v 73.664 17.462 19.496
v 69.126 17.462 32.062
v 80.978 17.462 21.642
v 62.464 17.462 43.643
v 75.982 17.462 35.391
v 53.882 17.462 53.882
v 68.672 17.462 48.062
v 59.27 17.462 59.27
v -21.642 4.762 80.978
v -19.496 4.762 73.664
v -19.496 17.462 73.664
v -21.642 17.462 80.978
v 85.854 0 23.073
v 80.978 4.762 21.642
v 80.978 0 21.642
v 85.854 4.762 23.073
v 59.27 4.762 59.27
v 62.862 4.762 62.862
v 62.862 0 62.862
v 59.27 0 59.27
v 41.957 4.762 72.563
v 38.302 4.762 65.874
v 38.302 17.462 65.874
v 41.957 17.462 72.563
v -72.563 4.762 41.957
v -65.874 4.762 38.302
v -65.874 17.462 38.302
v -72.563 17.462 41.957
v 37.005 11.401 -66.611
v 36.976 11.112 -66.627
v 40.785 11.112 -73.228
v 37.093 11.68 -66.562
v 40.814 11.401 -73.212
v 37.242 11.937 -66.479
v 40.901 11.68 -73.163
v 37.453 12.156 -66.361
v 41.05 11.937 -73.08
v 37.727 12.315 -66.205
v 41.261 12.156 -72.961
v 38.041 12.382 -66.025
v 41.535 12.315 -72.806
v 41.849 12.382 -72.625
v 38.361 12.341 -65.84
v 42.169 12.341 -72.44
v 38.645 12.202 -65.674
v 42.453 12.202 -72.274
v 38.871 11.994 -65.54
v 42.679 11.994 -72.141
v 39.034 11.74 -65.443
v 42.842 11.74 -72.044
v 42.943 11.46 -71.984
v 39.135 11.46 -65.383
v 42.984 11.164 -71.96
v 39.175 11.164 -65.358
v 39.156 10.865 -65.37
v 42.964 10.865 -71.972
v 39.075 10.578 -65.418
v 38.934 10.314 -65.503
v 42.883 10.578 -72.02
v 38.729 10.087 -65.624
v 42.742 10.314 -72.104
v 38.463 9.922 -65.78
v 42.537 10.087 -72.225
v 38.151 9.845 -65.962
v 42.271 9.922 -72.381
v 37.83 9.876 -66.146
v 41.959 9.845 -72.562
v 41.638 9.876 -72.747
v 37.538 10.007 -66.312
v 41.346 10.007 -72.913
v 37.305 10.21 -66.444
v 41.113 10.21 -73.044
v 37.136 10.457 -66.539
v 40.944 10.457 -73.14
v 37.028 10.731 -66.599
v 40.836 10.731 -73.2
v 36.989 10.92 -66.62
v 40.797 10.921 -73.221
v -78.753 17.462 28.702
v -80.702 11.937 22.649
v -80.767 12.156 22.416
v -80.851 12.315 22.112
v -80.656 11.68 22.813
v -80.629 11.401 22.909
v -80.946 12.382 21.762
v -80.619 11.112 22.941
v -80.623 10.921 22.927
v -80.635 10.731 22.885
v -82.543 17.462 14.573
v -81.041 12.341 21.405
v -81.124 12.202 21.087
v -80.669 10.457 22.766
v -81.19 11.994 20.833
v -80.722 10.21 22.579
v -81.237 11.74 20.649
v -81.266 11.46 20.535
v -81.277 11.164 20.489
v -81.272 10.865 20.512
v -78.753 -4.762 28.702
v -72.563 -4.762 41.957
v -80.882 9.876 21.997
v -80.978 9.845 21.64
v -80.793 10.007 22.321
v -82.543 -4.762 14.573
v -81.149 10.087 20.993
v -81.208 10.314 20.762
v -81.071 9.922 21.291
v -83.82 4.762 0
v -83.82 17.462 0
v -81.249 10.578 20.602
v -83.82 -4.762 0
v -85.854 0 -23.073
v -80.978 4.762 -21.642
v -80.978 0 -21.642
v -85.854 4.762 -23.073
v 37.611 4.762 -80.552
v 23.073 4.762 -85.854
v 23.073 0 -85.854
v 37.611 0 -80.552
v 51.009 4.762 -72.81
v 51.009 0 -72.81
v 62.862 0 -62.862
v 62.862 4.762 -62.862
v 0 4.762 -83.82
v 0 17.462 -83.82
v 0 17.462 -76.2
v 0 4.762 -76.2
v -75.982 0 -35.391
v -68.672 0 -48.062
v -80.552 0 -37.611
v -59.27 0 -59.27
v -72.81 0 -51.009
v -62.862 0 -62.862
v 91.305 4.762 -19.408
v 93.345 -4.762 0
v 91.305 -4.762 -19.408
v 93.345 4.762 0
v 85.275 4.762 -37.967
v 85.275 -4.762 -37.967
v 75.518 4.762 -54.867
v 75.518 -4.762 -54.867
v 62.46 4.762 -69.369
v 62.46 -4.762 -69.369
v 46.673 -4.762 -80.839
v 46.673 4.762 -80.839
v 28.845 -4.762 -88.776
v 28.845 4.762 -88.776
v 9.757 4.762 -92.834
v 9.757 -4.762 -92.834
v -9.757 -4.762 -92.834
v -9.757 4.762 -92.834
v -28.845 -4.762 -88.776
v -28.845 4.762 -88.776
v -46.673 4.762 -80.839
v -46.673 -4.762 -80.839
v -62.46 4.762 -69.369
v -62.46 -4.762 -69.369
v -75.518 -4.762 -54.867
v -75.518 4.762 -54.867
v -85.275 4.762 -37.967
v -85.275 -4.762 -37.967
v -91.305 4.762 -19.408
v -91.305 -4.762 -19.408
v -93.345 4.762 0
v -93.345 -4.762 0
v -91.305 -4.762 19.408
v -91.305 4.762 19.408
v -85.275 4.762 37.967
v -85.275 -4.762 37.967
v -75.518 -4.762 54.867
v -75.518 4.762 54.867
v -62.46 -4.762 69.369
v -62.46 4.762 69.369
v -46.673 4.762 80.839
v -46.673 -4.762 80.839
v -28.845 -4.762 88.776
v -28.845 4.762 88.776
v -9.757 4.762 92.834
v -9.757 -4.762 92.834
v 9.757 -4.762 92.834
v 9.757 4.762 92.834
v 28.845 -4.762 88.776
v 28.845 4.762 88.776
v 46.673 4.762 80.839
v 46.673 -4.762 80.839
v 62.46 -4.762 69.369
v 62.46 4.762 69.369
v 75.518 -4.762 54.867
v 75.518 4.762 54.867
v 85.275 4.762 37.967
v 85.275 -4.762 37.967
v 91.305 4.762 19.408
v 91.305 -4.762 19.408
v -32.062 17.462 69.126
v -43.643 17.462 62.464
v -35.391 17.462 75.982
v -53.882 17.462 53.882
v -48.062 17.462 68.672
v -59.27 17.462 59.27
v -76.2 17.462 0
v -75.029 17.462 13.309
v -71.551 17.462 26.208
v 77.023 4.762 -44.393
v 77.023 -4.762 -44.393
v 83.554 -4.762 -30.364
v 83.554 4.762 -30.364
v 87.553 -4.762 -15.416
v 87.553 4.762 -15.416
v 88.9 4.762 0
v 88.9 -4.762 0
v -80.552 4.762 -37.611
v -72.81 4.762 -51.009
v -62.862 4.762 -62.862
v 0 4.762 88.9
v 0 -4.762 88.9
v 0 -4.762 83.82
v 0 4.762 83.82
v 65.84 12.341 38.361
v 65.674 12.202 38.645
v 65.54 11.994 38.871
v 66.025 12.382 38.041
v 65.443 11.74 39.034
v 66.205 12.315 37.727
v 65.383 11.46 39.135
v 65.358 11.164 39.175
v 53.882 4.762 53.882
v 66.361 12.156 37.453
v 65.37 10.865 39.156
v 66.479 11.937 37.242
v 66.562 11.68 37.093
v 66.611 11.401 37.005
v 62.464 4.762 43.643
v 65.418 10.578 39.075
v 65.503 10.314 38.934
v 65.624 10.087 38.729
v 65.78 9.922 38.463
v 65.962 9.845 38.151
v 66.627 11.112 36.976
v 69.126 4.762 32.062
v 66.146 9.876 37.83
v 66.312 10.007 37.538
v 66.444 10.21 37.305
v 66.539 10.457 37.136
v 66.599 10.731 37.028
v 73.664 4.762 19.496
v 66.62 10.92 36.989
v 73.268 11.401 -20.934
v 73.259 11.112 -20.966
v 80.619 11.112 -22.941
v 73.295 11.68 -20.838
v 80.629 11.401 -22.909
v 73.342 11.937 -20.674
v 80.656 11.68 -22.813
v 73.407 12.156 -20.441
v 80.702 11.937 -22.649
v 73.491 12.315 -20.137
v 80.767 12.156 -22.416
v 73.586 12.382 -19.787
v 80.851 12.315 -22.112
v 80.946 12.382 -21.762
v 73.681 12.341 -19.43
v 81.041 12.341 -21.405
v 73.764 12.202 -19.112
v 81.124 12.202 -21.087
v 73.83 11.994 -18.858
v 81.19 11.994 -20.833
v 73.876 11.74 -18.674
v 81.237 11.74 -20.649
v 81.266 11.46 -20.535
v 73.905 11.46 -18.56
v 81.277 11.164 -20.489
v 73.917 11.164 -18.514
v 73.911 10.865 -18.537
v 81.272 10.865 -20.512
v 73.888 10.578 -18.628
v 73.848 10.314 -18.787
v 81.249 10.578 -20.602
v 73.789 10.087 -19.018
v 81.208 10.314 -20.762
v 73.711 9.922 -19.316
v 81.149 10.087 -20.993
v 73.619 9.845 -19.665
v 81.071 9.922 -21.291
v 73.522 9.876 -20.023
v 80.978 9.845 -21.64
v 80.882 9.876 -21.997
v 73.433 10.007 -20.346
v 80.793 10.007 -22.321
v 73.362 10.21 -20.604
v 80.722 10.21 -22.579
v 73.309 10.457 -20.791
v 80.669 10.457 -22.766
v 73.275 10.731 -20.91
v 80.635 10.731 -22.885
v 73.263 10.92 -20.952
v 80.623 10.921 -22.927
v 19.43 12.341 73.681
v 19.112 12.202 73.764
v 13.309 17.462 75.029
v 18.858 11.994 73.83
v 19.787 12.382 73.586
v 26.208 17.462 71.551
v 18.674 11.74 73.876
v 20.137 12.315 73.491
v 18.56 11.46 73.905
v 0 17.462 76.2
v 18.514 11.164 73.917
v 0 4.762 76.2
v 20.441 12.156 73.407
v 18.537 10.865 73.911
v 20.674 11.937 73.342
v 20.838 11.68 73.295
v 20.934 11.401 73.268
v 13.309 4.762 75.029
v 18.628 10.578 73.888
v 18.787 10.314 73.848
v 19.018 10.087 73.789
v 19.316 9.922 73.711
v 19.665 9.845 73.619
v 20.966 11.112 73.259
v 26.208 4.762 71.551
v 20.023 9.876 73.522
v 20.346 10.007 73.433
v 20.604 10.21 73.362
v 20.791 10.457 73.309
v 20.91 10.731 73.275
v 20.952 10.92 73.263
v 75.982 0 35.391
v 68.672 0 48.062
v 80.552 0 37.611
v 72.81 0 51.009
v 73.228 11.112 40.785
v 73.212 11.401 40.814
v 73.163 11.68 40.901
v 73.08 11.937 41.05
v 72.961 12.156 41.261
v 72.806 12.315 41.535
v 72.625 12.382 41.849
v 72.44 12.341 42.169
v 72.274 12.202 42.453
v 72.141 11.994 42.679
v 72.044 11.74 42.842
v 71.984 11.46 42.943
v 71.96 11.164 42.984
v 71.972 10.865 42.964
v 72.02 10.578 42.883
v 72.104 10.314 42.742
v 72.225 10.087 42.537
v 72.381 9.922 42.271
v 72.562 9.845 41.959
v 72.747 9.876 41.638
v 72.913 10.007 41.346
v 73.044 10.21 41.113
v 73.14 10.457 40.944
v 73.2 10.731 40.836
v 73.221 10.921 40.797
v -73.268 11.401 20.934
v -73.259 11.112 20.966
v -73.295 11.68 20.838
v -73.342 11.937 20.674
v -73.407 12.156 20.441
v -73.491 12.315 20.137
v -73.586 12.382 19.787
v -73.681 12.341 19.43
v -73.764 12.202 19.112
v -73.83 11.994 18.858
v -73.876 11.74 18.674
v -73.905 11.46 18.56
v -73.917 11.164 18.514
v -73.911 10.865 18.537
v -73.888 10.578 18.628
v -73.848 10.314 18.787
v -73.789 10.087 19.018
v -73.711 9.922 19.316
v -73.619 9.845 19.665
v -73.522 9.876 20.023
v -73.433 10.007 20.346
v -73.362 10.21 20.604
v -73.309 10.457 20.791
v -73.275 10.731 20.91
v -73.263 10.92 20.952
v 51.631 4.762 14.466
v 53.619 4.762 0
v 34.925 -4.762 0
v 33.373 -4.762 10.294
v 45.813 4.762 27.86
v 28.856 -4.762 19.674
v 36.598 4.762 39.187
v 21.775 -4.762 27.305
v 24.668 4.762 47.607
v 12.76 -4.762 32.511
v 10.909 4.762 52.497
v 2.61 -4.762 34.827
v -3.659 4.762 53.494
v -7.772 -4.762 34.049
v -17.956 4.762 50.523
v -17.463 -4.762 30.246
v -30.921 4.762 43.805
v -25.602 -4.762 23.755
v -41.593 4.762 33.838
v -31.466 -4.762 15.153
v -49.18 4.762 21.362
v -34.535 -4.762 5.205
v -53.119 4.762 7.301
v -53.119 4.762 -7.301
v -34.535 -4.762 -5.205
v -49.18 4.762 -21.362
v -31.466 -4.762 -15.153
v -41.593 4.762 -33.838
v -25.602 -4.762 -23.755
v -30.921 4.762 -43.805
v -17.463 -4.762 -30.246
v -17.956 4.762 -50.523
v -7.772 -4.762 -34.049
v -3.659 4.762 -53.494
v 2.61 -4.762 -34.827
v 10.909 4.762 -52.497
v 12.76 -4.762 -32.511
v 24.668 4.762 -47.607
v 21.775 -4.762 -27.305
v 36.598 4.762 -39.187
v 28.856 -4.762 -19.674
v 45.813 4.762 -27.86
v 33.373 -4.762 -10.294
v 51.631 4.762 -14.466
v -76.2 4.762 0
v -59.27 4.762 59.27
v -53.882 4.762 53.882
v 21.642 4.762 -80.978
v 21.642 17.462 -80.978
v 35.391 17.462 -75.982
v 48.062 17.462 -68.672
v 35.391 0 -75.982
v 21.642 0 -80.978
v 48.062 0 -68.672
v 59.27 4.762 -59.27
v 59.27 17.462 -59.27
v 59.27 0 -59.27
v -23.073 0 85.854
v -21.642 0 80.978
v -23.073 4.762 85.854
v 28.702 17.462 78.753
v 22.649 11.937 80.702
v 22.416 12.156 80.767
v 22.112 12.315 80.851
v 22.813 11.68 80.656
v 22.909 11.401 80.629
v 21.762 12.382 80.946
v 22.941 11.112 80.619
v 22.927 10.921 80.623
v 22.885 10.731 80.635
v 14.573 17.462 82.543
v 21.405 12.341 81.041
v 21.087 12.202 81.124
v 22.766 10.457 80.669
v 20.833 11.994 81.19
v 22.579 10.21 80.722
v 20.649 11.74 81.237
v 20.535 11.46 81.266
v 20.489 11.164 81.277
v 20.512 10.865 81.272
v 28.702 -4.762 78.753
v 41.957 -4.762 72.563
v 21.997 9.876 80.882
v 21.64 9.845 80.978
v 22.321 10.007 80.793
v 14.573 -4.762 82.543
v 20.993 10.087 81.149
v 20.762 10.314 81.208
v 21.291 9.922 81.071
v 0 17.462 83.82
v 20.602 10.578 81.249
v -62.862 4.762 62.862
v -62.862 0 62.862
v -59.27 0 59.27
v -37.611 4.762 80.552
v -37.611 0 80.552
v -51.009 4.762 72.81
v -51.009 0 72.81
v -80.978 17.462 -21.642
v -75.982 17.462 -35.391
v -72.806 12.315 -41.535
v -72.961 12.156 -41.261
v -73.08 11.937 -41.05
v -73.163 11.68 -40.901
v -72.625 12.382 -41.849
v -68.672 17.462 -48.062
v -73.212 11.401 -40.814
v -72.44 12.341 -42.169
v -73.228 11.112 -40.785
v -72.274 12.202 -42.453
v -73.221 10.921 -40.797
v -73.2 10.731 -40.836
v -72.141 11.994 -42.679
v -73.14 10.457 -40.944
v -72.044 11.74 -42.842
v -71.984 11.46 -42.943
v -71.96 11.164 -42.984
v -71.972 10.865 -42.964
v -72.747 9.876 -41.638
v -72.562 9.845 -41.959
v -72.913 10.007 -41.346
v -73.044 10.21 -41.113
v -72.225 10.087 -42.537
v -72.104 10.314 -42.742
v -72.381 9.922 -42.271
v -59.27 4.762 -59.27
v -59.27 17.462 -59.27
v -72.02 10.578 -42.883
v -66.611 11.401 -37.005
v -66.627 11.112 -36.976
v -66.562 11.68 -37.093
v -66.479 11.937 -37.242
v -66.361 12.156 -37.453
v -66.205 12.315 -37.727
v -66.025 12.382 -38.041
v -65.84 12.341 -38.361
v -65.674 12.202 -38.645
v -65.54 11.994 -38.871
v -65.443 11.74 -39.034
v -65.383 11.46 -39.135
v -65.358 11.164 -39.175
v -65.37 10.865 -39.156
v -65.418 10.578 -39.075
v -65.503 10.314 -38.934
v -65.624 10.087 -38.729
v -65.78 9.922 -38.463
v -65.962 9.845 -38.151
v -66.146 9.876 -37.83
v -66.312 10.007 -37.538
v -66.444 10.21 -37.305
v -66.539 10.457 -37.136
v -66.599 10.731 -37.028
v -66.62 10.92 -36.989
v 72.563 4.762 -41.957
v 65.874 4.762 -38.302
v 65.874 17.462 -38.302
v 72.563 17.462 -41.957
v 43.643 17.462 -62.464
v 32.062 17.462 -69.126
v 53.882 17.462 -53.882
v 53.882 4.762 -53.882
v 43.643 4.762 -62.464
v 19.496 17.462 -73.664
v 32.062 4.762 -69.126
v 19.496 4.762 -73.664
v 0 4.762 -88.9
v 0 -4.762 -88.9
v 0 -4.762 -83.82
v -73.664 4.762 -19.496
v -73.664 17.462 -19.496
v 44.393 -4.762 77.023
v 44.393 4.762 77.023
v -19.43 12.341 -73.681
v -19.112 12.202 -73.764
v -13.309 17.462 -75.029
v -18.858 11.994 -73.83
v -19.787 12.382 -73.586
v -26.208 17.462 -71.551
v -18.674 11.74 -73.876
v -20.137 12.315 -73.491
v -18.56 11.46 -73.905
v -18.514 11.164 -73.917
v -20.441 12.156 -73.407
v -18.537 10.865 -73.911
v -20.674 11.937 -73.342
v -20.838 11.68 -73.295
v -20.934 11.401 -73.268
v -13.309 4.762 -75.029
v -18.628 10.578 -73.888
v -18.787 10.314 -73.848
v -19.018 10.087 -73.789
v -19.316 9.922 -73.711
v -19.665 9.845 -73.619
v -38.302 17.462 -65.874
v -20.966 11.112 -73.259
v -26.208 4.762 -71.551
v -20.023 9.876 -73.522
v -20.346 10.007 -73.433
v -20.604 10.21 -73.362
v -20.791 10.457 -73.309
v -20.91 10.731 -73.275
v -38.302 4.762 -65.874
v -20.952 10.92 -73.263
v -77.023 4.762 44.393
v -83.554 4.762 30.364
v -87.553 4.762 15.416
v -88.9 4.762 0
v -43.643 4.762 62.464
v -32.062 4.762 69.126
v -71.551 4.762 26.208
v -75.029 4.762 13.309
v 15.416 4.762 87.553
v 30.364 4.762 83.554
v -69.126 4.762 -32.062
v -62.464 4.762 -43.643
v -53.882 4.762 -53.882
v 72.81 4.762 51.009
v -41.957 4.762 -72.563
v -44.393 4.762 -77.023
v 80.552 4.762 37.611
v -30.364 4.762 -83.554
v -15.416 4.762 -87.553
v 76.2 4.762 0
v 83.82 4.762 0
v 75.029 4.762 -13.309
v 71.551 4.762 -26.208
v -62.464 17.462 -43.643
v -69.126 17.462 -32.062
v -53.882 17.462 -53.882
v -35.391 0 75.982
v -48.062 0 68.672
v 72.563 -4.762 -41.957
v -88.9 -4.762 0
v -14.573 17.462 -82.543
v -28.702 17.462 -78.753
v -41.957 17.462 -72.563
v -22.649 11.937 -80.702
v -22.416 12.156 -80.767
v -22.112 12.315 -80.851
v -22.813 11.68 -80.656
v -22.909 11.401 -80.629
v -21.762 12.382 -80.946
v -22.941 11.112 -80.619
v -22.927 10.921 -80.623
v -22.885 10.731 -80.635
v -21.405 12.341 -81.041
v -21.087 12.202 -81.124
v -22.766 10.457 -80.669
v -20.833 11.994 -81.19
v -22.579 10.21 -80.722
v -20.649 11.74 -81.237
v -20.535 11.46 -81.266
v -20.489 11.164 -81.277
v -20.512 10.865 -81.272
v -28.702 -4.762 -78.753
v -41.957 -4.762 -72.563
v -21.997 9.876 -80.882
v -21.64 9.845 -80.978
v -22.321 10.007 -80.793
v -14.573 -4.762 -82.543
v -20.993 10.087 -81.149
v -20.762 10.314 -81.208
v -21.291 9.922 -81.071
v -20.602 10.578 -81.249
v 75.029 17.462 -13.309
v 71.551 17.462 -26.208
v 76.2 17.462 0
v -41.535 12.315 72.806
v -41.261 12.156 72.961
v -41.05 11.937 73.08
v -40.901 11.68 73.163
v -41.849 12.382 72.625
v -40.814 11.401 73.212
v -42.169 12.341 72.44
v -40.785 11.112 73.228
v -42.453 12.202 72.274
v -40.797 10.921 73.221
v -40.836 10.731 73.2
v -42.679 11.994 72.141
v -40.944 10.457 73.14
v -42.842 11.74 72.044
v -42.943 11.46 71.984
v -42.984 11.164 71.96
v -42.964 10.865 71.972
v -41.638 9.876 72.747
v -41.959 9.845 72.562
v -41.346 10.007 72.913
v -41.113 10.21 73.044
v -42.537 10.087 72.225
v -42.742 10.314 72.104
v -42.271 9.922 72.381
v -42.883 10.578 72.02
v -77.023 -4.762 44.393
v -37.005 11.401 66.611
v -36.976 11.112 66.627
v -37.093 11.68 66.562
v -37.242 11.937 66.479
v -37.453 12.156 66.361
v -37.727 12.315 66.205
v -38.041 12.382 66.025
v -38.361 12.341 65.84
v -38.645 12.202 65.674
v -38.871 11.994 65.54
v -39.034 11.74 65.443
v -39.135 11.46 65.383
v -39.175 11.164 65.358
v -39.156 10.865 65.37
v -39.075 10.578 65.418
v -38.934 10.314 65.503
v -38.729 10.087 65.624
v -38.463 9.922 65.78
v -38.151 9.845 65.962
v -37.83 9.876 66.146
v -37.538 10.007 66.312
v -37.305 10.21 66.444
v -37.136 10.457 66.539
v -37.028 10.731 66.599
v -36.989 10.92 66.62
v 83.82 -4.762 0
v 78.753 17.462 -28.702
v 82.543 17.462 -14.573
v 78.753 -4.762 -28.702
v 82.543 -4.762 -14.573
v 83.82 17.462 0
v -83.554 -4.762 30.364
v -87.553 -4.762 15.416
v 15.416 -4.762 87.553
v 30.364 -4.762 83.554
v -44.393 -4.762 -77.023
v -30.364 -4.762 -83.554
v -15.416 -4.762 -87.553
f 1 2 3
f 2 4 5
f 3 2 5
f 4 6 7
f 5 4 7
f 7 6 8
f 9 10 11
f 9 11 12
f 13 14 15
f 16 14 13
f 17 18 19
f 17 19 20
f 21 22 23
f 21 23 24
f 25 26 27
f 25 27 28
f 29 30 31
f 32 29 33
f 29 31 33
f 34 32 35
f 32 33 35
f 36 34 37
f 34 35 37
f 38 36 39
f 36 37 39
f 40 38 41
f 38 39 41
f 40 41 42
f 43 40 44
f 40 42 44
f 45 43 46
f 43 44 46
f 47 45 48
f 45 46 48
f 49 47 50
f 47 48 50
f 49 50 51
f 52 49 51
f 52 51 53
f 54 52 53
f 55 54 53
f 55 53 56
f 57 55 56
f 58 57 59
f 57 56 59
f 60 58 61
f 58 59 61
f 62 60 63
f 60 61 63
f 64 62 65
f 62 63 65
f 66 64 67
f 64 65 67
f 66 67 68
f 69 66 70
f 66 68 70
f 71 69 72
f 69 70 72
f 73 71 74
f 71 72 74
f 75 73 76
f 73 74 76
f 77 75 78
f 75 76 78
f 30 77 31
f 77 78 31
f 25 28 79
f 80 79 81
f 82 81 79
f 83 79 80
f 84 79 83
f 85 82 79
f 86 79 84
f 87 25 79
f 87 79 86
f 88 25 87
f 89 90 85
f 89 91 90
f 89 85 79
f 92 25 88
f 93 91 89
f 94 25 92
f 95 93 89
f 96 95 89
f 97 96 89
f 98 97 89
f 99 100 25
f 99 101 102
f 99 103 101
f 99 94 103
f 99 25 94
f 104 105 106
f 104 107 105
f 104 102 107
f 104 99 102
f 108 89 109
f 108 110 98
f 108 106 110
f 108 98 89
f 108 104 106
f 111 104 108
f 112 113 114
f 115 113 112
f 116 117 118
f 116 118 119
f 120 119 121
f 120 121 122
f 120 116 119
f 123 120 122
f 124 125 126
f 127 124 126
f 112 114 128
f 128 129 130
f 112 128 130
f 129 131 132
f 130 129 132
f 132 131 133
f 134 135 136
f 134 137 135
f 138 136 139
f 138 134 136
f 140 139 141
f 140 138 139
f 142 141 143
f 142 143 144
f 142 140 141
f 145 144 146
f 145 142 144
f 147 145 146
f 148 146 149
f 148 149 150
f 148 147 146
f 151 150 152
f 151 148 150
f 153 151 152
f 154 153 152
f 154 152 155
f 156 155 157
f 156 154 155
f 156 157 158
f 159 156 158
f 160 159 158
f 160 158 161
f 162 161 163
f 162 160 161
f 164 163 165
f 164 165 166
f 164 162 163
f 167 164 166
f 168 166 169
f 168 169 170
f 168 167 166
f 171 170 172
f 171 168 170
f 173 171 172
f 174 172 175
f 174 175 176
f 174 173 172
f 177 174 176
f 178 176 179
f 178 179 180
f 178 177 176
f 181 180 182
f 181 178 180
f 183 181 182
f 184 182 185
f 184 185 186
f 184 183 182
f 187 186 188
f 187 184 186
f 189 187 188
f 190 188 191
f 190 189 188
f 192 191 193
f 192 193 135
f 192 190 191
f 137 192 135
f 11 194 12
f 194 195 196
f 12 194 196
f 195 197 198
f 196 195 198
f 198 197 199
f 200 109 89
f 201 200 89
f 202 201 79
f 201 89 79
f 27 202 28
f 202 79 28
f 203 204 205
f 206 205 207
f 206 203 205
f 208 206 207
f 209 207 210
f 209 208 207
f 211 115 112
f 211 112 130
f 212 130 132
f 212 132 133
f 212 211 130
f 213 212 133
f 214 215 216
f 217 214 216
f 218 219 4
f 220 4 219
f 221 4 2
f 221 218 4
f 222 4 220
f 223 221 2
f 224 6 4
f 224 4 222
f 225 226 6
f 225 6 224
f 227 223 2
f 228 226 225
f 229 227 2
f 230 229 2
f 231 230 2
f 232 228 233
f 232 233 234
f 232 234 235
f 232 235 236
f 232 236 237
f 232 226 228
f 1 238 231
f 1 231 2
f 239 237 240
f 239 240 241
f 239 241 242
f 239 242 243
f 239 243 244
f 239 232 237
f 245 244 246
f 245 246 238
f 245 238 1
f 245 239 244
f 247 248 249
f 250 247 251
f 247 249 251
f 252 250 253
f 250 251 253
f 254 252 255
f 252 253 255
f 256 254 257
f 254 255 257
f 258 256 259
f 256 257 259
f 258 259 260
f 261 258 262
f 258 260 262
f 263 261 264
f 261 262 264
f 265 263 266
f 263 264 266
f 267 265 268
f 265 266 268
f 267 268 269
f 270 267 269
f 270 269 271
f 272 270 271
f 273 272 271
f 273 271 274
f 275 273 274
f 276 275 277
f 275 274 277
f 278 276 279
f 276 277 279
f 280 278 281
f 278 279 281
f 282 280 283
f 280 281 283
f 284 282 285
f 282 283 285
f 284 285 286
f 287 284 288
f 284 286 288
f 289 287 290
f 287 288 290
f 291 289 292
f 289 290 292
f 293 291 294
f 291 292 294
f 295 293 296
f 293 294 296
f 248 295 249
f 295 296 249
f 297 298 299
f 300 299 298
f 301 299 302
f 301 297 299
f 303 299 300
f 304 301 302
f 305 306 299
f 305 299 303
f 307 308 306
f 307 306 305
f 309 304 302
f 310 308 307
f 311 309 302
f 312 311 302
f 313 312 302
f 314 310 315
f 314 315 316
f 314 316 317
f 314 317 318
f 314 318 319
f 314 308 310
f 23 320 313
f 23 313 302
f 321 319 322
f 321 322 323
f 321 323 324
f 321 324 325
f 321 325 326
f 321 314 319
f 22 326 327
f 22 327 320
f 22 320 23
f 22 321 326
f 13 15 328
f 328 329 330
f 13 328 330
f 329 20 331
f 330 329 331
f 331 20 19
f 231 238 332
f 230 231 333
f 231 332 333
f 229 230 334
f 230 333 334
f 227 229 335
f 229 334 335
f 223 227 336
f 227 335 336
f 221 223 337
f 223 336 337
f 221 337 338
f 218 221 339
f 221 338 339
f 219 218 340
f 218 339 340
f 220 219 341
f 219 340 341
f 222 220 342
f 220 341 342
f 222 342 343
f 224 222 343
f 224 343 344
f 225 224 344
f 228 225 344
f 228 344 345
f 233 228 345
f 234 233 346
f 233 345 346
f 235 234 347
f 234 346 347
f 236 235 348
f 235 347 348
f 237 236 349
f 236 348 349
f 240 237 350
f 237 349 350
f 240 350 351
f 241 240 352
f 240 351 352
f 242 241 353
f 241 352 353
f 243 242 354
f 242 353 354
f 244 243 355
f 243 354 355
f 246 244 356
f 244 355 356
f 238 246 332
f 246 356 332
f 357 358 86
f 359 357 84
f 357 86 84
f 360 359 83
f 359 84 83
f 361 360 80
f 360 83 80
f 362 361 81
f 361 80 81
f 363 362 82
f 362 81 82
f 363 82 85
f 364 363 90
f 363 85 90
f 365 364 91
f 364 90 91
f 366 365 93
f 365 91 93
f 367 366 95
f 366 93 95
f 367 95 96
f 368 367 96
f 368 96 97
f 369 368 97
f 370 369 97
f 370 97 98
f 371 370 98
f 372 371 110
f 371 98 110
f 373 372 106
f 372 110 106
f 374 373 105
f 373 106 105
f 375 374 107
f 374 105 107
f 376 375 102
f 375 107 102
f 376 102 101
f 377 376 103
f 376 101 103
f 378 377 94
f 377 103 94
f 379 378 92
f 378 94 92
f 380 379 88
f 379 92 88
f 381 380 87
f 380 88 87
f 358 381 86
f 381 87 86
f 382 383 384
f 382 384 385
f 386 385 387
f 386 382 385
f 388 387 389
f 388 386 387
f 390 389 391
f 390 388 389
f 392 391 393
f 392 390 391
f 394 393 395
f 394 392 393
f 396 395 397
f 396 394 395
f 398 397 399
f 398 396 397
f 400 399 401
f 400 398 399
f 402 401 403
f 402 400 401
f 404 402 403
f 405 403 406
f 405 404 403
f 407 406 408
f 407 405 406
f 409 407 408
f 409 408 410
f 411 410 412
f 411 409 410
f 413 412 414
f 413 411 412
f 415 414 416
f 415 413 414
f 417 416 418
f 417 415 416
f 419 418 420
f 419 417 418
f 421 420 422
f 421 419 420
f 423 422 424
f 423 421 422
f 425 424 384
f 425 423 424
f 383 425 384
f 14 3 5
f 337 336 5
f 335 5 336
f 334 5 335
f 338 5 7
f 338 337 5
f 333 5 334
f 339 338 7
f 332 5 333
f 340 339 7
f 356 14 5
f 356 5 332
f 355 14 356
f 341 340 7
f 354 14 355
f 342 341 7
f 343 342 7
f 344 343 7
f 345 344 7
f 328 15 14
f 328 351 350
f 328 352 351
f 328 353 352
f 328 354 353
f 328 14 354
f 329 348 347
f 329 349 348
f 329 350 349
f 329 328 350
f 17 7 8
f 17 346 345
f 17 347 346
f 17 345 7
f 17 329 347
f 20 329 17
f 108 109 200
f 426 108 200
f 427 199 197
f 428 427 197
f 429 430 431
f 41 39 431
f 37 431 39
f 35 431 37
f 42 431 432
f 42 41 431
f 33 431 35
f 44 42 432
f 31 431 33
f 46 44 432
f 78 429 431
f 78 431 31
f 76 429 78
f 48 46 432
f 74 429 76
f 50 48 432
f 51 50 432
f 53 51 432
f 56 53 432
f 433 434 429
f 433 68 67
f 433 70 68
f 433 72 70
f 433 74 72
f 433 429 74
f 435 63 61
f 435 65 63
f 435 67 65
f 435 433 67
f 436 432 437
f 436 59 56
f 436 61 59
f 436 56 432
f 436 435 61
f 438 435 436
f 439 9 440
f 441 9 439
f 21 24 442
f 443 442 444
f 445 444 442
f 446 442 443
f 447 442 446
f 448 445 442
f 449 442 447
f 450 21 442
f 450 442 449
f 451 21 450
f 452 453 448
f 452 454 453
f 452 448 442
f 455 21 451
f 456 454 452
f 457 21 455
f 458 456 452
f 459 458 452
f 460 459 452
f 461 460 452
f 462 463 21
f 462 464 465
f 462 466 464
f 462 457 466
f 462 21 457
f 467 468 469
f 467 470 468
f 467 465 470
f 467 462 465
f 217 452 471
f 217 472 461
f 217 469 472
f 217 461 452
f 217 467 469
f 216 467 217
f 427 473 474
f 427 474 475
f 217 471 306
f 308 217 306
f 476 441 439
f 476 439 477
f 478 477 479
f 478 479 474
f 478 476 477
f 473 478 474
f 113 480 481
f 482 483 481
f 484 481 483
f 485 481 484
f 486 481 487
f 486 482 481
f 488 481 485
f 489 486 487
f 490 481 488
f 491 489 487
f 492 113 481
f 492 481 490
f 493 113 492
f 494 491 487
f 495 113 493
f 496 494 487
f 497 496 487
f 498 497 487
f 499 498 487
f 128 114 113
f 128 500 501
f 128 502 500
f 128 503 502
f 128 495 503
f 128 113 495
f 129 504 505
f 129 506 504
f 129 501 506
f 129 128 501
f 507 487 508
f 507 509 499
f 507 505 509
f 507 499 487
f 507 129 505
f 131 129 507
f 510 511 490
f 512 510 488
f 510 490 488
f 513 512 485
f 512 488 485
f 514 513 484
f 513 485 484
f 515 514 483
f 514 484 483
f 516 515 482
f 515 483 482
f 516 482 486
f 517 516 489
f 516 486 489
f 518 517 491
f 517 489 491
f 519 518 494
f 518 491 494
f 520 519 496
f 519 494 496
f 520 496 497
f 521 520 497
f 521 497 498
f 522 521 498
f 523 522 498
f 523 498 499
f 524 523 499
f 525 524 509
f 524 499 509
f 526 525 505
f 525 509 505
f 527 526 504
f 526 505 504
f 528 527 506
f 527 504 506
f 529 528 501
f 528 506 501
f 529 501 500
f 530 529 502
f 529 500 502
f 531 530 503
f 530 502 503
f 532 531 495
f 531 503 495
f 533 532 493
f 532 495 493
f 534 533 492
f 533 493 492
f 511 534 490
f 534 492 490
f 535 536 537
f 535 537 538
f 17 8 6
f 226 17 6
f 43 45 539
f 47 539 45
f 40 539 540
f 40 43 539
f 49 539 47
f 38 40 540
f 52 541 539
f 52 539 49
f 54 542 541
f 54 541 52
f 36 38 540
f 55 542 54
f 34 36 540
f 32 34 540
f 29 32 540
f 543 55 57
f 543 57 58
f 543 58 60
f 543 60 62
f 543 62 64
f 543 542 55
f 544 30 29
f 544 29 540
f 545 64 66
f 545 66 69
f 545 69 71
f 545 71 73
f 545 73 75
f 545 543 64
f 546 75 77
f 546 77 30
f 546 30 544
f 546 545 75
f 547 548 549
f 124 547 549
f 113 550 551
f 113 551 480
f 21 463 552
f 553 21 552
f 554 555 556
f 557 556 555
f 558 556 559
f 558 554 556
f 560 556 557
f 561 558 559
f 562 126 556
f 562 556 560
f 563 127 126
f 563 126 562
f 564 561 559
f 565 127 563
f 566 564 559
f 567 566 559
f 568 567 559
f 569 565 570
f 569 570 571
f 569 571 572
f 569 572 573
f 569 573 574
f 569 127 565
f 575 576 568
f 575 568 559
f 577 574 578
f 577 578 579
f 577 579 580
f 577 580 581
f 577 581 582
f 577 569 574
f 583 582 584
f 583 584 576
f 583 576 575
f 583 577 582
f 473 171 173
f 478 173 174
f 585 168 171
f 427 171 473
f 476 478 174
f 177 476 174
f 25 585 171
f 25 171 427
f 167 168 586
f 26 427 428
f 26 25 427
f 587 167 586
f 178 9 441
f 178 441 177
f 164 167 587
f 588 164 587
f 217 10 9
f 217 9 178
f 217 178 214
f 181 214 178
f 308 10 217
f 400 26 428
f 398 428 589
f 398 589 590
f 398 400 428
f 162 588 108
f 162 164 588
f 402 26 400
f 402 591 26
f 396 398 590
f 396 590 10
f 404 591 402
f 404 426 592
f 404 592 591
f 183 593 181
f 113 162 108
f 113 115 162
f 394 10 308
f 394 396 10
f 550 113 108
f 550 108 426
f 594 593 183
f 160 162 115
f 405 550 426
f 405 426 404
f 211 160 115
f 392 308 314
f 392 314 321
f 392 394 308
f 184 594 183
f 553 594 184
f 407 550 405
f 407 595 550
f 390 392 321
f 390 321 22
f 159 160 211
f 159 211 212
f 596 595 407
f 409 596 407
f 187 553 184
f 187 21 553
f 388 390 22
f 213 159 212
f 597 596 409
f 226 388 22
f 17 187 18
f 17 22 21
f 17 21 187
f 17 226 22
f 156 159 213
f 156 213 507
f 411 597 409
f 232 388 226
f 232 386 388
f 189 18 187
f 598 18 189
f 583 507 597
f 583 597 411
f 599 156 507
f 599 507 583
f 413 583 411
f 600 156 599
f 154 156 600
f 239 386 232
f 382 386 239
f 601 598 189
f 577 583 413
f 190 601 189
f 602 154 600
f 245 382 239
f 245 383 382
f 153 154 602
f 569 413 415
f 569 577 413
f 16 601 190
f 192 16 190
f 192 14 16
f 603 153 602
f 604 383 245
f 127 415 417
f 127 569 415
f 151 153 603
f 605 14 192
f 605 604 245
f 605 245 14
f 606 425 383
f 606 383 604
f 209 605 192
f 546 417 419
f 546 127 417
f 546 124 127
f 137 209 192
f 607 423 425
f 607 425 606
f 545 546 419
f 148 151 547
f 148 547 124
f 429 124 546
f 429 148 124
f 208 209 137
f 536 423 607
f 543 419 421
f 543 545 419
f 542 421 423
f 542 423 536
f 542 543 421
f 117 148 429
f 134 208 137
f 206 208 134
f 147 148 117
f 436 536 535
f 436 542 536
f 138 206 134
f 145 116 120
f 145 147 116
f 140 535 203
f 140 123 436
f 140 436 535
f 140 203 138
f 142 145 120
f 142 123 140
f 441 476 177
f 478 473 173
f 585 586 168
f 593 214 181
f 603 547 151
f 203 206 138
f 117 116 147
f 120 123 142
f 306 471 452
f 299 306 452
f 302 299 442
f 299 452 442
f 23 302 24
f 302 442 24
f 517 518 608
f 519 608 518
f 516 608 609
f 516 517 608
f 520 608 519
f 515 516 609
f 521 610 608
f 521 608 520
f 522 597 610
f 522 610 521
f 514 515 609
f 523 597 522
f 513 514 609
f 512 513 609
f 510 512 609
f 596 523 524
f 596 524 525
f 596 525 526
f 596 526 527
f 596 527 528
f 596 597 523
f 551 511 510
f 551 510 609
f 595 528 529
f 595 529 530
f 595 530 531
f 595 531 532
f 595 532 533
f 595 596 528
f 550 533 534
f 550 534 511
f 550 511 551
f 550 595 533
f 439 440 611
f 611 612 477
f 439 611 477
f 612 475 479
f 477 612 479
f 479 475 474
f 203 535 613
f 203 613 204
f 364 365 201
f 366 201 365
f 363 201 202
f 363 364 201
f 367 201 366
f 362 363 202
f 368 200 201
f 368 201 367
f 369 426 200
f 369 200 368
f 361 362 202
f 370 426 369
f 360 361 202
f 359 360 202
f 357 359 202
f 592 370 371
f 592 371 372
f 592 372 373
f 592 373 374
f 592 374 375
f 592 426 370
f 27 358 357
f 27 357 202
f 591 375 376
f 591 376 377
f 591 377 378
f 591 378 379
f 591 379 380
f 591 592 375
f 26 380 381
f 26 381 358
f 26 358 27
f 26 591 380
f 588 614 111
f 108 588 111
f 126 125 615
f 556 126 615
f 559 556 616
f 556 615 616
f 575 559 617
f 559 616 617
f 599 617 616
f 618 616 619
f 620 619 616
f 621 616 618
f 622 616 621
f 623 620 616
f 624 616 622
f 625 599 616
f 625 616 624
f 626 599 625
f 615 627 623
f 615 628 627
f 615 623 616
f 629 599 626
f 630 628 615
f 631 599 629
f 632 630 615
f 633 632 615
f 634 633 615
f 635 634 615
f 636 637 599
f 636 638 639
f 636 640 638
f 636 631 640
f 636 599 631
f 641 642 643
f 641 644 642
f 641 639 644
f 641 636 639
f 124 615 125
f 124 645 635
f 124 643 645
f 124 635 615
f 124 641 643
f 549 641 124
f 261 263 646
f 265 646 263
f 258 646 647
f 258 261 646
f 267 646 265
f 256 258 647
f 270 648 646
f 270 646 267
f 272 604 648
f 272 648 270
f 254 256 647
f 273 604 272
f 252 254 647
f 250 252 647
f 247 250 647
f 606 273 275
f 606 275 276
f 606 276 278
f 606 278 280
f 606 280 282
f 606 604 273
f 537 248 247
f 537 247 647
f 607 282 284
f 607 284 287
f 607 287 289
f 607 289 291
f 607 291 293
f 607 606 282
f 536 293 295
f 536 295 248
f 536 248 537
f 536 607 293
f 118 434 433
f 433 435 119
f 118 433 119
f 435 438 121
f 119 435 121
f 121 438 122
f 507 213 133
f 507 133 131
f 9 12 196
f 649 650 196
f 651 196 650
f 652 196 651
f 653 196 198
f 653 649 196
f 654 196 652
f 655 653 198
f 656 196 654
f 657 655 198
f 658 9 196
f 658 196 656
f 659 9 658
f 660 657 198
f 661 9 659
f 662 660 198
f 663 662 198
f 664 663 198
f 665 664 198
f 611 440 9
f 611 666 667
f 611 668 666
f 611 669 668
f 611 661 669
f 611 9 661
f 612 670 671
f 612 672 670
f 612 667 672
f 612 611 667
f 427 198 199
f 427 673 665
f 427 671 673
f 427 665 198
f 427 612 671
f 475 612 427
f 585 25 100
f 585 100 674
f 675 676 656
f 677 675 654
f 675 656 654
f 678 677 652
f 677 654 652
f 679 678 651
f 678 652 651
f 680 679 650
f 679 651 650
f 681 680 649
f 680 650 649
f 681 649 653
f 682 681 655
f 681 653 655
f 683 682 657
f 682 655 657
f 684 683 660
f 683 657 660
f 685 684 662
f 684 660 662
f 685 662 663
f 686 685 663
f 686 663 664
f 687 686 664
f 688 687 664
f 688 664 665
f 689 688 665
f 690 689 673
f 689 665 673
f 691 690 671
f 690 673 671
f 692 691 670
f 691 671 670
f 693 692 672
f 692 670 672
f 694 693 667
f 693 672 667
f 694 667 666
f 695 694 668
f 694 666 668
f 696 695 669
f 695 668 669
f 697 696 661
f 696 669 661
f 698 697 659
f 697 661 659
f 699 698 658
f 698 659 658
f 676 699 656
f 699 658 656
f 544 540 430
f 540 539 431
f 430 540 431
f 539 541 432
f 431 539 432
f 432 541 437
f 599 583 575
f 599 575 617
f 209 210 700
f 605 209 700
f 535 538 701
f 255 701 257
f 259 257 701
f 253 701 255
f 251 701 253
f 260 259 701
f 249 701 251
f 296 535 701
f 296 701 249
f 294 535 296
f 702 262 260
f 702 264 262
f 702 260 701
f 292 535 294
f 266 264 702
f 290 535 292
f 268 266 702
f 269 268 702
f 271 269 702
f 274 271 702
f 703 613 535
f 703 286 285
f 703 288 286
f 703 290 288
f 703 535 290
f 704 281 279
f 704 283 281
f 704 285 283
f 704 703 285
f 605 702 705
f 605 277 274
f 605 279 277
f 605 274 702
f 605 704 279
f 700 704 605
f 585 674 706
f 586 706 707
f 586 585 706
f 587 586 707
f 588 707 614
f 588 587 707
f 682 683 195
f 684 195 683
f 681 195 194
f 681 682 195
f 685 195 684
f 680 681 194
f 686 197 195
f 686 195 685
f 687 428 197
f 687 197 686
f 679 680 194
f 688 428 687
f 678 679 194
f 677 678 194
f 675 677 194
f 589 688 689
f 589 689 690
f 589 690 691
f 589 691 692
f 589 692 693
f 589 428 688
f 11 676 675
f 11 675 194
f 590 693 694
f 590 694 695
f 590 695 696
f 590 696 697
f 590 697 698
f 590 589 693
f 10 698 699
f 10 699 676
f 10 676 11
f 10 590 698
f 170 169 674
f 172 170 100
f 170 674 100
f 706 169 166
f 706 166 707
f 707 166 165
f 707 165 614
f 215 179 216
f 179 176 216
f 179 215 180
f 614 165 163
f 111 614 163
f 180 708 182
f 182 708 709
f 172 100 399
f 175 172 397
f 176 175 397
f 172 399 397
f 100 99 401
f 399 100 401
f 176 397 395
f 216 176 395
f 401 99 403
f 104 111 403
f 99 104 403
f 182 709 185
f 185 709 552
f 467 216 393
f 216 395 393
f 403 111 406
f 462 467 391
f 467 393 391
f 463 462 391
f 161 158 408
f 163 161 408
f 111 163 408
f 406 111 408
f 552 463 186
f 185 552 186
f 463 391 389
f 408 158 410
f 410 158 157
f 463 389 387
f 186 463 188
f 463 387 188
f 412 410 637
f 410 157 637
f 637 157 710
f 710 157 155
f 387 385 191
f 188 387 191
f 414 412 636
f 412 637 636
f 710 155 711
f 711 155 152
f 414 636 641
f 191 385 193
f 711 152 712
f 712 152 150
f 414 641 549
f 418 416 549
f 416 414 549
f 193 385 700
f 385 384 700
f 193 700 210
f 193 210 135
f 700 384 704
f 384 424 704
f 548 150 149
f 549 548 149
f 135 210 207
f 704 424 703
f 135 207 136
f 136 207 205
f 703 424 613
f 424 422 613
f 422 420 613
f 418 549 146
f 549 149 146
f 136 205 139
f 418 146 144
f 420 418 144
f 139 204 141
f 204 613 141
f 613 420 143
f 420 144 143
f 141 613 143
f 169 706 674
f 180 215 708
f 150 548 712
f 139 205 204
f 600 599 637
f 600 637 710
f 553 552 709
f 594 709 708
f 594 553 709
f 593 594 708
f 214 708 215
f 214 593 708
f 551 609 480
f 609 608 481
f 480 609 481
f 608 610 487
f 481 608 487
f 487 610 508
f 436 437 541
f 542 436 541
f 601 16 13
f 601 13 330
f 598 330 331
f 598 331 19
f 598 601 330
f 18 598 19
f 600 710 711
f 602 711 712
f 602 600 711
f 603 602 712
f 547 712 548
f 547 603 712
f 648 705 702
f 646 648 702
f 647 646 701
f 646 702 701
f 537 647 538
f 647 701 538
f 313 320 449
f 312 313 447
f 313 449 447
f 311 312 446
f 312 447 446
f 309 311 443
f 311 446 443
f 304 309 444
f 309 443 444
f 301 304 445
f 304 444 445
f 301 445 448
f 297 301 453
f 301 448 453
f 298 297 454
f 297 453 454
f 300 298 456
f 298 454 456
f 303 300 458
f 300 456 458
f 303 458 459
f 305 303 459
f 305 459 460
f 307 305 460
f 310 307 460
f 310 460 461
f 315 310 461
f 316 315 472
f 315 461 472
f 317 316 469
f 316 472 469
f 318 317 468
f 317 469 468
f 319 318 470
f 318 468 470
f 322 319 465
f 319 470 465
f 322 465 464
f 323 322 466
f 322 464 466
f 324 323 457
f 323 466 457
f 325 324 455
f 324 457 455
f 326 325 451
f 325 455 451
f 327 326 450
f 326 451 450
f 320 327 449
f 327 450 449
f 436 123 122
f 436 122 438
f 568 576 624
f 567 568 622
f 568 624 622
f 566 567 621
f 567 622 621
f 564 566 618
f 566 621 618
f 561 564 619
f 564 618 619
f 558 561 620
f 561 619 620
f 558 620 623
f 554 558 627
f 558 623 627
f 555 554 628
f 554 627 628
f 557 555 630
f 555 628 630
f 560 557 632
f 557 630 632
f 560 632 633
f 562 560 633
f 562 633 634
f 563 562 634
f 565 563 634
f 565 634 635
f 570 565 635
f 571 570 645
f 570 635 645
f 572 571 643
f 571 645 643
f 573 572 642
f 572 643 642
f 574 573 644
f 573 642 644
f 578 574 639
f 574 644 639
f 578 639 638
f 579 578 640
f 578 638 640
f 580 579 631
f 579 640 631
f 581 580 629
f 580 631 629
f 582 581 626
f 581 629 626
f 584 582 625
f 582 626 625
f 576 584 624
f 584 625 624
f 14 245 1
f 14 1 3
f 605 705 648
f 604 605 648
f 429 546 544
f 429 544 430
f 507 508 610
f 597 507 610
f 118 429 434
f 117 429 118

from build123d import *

# Parameters (mm, degrees)
BASE_DEPTH                 = 4.7625
BASE_DEPTH_BACK            = 4.7625
SKETCH1_R                  = 93.345
BOTTOM_SUPPORT_HOLES_DEPTH = 133.352951138
BOTTOM_START               = 12.7
BOTTOM_SUPPORT_GUIDE_DEPTH = 12.7
SKETCH6_R                  = 1.27
BOTTOM_BOLT_HOLE_DEPTH     = 12.7
TOP_SUPPORT_HOLES_DEPTH    = 4.7625
TOP_START                  = 12.7
TOP_SUPPORT_GUIDE_DEPTH    = 12.7
SKETCH12_R                 = 1.27
TOP_BOLT_HOLE_DEPTH        = 12.7
BOTTOM_PATTERN_COUNT       = 4
CIRPATTERN3_COUNT          = 4
SKETCH13_R                 = 34.925
CUT_EXTRUDE5_DEPTH         = 12.7


with BuildPart() as part:
    # Sketch1 → Base (new, two sides: drawn at the far end of the back side and taken through both)
    with BuildSketch(Plane(origin=(0, 0, 0), x_dir=(1, 0, 0), z_dir=(0, 1, 0)).offset(-BASE_DEPTH_BACK)):
        Circle(SKETCH1_R)
    extrude(amount=BASE_DEPTH + BASE_DEPTH_BACK)

    # Sketch2 → Bottom support holes (cut, through all)
    with BuildSketch(Plane(origin=(0, 4.7625, 0), x_dir=(1, 0, 0), z_dir=(0, 1, 0))):
        with BuildLine():
            Line((0, 88.9), (0, 83.82))
            ThreePointArc((0, 83.82), (-21.72026739, 80.956916842), (-41.956713931, 72.563258996))
            Line((-41.956713931, 72.563258996), (-44.39288973, 77.022602796))
            ThreePointArc((-44.39288973, 77.022602796), (-22.977169228, 85.879332172), (0, 88.9))
        make_face()
    bottom_support_holes = extrude(amount=-BOTTOM_SUPPORT_HOLES_DEPTH, mode=Mode.SUBTRACT)

    # Sketch3 → Bottom support guide (add)
    with BuildSketch(Plane(origin=(0, 4.7625, 0), x_dir=(1, 0, 0), z_dir=(0, 1, 0)).offset(BOTTOM_START)):
        with BuildLine():
            Line((0, 83.82), (0, 76.2))
            ThreePointArc((0, 76.2), (-19.834896001, 73.573207764), (-38.302281481, 65.8739344))
            Line((-38.302281481, 65.8739344), (-41.956713931, 72.563258996))
            ThreePointArc((-41.956713931, 72.563258996), (-21.72026739, 80.956916842), (0, 83.82))
        make_face()
    bottom_support_guide = extrude(amount=-BOTTOM_SUPPORT_GUIDE_DEPTH)

    # Sketch6 → Bottom bolt hole (cut, symmetric)
    with BuildSketch(Plane(origin=(-20.978356966, 0, -78.191629498), x_dir=(-0.9658424820058785, 0, 0.2591298901183038), z_dir=(-0.2591298901183038, 0, -0.9658424820058785))):
        with Locations((-0.00326739, 11.1125)):
            Circle(SKETCH6_R)
    bottom_bolt_hole = extrude(amount=BOTTOM_BOLT_HOLE_DEPTH, both=True, mode=Mode.SUBTRACT)

    # Sketch8 → Top support holes (cut)
    with BuildSketch(Plane(origin=(-31.122978549, 4.7625, 77.296707326), x_dir=(1, 0, 0), z_dir=(0, 1, 0))):
        with BuildLine():
            Line((-31.738814298, 140.158500173), (-28.14671185, 136.566397725))
            ThreePointArc((-28.14671185, 136.566397725), (-41.480754694, 119.183343848), (-49.854870889, 98.93880289))
            Line((-49.854870889, 98.93880289), (-54.730739557, 100.369398703))
            ThreePointArc((-54.730739557, 100.369398703), (-45.850191767, 121.775253295), (-31.738814298, 140.158500173))
        make_face()
    top_support_holes = extrude(amount=-TOP_SUPPORT_HOLES_DEPTH, mode=Mode.SUBTRACT)

    # Sketch10 → Top support guide (add)
    with BuildSketch(Plane(origin=(-31.122978549, 4.7625, 77.296707326), x_dir=(1, 0, 0), z_dir=(0, 1, 0)).offset(TOP_START)):
        with BuildLine():
            Line((-28.14671185, 136.566397725), (-22.758558177, 131.178244052))
            ThreePointArc((-22.758558177, 131.178244052), (-34.92652504, 115.295431983), (-42.540730139, 96.792810073))
            Line((-42.540730139, 96.792810073), (-49.854870889, 98.93880289))
            ThreePointArc((-49.854870889, 98.93880289), (-41.480754694, 119.183343848), (-28.14671185, 136.566397725))
        make_face()
    top_support_guide = extrude(amount=-TOP_SUPPORT_GUIDE_DEPTH)

    # Sketch12 → Top bolt hole (cut, symmetric)
    with BuildSketch(Plane(origin=(-70.123769919, 0, -40.455892982), x_dir=(-0.4997212660736201, -5.817861610189737e-15, 0.8661862710951832), z_dir=(-0.8661862710951832, 1.404556040332972e-14, -0.4997212660736201))):
        with Locations((-0.00326739, 11.1125)):
            Circle(SKETCH12_R)
    top_bolt_hole = extrude(amount=TOP_BOLT_HOLE_DEPTH, both=True, mode=Mode.SUBTRACT)

    # Bottom pattern: Bottom support holes, Bottom support guide, Bottom bolt hole ×4 about axis
    bottom_pattern_axis = Axis((0, 4.7625, 0), (0, 1, 0))
    add([bottom_support_holes.rotate(bottom_pattern_axis, i * 360 / BOTTOM_PATTERN_COUNT) for i in range(1, BOTTOM_PATTERN_COUNT)], mode=Mode.SUBTRACT)
    add([bottom_support_guide.rotate(bottom_pattern_axis, i * 360 / BOTTOM_PATTERN_COUNT) for i in range(1, BOTTOM_PATTERN_COUNT)])
    add([bottom_bolt_hole.rotate(bottom_pattern_axis, i * 360 / BOTTOM_PATTERN_COUNT) for i in range(1, BOTTOM_PATTERN_COUNT)], mode=Mode.SUBTRACT)

    # CirPattern3: Top support holes, Top support guide, Top bolt hole ×4 about axis
    cirpattern3_axis = Axis((0, 4.7625, 0), (0, 1, 0))
    add([top_support_holes.rotate(cirpattern3_axis, i * 360 / CIRPATTERN3_COUNT) for i in range(1, CIRPATTERN3_COUNT)], mode=Mode.SUBTRACT)
    add([top_support_guide.rotate(cirpattern3_axis, i * 360 / CIRPATTERN3_COUNT) for i in range(1, CIRPATTERN3_COUNT)])
    add([top_bolt_hole.rotate(cirpattern3_axis, i * 360 / CIRPATTERN3_COUNT) for i in range(1, CIRPATTERN3_COUNT)], mode=Mode.SUBTRACT)

    # Sketch13 → Cut-Extrude5 (cut)
    with BuildSketch(Plane(origin=(0, 4.7625, 0), x_dir=(1, 0, 0), z_dir=(0, 1, 0))):
        Circle(SKETCH13_R)
    extrude(amount=-CUT_EXTRUDE5_DEPTH, mode=Mode.SUBTRACT)

    # Sketch14 → Cut-Revolve1 (revolve, cut)
    with BuildSketch(Plane.XY):
        Polygon((34.925, 4.7625), (34.925, -4.7625), (53.618865065, 4.7625), align=None)
    revolve(axis=Axis((0, 25.4, 0), (0, -1, 0)), mode=Mode.SUBTRACT)


solid = part.part
